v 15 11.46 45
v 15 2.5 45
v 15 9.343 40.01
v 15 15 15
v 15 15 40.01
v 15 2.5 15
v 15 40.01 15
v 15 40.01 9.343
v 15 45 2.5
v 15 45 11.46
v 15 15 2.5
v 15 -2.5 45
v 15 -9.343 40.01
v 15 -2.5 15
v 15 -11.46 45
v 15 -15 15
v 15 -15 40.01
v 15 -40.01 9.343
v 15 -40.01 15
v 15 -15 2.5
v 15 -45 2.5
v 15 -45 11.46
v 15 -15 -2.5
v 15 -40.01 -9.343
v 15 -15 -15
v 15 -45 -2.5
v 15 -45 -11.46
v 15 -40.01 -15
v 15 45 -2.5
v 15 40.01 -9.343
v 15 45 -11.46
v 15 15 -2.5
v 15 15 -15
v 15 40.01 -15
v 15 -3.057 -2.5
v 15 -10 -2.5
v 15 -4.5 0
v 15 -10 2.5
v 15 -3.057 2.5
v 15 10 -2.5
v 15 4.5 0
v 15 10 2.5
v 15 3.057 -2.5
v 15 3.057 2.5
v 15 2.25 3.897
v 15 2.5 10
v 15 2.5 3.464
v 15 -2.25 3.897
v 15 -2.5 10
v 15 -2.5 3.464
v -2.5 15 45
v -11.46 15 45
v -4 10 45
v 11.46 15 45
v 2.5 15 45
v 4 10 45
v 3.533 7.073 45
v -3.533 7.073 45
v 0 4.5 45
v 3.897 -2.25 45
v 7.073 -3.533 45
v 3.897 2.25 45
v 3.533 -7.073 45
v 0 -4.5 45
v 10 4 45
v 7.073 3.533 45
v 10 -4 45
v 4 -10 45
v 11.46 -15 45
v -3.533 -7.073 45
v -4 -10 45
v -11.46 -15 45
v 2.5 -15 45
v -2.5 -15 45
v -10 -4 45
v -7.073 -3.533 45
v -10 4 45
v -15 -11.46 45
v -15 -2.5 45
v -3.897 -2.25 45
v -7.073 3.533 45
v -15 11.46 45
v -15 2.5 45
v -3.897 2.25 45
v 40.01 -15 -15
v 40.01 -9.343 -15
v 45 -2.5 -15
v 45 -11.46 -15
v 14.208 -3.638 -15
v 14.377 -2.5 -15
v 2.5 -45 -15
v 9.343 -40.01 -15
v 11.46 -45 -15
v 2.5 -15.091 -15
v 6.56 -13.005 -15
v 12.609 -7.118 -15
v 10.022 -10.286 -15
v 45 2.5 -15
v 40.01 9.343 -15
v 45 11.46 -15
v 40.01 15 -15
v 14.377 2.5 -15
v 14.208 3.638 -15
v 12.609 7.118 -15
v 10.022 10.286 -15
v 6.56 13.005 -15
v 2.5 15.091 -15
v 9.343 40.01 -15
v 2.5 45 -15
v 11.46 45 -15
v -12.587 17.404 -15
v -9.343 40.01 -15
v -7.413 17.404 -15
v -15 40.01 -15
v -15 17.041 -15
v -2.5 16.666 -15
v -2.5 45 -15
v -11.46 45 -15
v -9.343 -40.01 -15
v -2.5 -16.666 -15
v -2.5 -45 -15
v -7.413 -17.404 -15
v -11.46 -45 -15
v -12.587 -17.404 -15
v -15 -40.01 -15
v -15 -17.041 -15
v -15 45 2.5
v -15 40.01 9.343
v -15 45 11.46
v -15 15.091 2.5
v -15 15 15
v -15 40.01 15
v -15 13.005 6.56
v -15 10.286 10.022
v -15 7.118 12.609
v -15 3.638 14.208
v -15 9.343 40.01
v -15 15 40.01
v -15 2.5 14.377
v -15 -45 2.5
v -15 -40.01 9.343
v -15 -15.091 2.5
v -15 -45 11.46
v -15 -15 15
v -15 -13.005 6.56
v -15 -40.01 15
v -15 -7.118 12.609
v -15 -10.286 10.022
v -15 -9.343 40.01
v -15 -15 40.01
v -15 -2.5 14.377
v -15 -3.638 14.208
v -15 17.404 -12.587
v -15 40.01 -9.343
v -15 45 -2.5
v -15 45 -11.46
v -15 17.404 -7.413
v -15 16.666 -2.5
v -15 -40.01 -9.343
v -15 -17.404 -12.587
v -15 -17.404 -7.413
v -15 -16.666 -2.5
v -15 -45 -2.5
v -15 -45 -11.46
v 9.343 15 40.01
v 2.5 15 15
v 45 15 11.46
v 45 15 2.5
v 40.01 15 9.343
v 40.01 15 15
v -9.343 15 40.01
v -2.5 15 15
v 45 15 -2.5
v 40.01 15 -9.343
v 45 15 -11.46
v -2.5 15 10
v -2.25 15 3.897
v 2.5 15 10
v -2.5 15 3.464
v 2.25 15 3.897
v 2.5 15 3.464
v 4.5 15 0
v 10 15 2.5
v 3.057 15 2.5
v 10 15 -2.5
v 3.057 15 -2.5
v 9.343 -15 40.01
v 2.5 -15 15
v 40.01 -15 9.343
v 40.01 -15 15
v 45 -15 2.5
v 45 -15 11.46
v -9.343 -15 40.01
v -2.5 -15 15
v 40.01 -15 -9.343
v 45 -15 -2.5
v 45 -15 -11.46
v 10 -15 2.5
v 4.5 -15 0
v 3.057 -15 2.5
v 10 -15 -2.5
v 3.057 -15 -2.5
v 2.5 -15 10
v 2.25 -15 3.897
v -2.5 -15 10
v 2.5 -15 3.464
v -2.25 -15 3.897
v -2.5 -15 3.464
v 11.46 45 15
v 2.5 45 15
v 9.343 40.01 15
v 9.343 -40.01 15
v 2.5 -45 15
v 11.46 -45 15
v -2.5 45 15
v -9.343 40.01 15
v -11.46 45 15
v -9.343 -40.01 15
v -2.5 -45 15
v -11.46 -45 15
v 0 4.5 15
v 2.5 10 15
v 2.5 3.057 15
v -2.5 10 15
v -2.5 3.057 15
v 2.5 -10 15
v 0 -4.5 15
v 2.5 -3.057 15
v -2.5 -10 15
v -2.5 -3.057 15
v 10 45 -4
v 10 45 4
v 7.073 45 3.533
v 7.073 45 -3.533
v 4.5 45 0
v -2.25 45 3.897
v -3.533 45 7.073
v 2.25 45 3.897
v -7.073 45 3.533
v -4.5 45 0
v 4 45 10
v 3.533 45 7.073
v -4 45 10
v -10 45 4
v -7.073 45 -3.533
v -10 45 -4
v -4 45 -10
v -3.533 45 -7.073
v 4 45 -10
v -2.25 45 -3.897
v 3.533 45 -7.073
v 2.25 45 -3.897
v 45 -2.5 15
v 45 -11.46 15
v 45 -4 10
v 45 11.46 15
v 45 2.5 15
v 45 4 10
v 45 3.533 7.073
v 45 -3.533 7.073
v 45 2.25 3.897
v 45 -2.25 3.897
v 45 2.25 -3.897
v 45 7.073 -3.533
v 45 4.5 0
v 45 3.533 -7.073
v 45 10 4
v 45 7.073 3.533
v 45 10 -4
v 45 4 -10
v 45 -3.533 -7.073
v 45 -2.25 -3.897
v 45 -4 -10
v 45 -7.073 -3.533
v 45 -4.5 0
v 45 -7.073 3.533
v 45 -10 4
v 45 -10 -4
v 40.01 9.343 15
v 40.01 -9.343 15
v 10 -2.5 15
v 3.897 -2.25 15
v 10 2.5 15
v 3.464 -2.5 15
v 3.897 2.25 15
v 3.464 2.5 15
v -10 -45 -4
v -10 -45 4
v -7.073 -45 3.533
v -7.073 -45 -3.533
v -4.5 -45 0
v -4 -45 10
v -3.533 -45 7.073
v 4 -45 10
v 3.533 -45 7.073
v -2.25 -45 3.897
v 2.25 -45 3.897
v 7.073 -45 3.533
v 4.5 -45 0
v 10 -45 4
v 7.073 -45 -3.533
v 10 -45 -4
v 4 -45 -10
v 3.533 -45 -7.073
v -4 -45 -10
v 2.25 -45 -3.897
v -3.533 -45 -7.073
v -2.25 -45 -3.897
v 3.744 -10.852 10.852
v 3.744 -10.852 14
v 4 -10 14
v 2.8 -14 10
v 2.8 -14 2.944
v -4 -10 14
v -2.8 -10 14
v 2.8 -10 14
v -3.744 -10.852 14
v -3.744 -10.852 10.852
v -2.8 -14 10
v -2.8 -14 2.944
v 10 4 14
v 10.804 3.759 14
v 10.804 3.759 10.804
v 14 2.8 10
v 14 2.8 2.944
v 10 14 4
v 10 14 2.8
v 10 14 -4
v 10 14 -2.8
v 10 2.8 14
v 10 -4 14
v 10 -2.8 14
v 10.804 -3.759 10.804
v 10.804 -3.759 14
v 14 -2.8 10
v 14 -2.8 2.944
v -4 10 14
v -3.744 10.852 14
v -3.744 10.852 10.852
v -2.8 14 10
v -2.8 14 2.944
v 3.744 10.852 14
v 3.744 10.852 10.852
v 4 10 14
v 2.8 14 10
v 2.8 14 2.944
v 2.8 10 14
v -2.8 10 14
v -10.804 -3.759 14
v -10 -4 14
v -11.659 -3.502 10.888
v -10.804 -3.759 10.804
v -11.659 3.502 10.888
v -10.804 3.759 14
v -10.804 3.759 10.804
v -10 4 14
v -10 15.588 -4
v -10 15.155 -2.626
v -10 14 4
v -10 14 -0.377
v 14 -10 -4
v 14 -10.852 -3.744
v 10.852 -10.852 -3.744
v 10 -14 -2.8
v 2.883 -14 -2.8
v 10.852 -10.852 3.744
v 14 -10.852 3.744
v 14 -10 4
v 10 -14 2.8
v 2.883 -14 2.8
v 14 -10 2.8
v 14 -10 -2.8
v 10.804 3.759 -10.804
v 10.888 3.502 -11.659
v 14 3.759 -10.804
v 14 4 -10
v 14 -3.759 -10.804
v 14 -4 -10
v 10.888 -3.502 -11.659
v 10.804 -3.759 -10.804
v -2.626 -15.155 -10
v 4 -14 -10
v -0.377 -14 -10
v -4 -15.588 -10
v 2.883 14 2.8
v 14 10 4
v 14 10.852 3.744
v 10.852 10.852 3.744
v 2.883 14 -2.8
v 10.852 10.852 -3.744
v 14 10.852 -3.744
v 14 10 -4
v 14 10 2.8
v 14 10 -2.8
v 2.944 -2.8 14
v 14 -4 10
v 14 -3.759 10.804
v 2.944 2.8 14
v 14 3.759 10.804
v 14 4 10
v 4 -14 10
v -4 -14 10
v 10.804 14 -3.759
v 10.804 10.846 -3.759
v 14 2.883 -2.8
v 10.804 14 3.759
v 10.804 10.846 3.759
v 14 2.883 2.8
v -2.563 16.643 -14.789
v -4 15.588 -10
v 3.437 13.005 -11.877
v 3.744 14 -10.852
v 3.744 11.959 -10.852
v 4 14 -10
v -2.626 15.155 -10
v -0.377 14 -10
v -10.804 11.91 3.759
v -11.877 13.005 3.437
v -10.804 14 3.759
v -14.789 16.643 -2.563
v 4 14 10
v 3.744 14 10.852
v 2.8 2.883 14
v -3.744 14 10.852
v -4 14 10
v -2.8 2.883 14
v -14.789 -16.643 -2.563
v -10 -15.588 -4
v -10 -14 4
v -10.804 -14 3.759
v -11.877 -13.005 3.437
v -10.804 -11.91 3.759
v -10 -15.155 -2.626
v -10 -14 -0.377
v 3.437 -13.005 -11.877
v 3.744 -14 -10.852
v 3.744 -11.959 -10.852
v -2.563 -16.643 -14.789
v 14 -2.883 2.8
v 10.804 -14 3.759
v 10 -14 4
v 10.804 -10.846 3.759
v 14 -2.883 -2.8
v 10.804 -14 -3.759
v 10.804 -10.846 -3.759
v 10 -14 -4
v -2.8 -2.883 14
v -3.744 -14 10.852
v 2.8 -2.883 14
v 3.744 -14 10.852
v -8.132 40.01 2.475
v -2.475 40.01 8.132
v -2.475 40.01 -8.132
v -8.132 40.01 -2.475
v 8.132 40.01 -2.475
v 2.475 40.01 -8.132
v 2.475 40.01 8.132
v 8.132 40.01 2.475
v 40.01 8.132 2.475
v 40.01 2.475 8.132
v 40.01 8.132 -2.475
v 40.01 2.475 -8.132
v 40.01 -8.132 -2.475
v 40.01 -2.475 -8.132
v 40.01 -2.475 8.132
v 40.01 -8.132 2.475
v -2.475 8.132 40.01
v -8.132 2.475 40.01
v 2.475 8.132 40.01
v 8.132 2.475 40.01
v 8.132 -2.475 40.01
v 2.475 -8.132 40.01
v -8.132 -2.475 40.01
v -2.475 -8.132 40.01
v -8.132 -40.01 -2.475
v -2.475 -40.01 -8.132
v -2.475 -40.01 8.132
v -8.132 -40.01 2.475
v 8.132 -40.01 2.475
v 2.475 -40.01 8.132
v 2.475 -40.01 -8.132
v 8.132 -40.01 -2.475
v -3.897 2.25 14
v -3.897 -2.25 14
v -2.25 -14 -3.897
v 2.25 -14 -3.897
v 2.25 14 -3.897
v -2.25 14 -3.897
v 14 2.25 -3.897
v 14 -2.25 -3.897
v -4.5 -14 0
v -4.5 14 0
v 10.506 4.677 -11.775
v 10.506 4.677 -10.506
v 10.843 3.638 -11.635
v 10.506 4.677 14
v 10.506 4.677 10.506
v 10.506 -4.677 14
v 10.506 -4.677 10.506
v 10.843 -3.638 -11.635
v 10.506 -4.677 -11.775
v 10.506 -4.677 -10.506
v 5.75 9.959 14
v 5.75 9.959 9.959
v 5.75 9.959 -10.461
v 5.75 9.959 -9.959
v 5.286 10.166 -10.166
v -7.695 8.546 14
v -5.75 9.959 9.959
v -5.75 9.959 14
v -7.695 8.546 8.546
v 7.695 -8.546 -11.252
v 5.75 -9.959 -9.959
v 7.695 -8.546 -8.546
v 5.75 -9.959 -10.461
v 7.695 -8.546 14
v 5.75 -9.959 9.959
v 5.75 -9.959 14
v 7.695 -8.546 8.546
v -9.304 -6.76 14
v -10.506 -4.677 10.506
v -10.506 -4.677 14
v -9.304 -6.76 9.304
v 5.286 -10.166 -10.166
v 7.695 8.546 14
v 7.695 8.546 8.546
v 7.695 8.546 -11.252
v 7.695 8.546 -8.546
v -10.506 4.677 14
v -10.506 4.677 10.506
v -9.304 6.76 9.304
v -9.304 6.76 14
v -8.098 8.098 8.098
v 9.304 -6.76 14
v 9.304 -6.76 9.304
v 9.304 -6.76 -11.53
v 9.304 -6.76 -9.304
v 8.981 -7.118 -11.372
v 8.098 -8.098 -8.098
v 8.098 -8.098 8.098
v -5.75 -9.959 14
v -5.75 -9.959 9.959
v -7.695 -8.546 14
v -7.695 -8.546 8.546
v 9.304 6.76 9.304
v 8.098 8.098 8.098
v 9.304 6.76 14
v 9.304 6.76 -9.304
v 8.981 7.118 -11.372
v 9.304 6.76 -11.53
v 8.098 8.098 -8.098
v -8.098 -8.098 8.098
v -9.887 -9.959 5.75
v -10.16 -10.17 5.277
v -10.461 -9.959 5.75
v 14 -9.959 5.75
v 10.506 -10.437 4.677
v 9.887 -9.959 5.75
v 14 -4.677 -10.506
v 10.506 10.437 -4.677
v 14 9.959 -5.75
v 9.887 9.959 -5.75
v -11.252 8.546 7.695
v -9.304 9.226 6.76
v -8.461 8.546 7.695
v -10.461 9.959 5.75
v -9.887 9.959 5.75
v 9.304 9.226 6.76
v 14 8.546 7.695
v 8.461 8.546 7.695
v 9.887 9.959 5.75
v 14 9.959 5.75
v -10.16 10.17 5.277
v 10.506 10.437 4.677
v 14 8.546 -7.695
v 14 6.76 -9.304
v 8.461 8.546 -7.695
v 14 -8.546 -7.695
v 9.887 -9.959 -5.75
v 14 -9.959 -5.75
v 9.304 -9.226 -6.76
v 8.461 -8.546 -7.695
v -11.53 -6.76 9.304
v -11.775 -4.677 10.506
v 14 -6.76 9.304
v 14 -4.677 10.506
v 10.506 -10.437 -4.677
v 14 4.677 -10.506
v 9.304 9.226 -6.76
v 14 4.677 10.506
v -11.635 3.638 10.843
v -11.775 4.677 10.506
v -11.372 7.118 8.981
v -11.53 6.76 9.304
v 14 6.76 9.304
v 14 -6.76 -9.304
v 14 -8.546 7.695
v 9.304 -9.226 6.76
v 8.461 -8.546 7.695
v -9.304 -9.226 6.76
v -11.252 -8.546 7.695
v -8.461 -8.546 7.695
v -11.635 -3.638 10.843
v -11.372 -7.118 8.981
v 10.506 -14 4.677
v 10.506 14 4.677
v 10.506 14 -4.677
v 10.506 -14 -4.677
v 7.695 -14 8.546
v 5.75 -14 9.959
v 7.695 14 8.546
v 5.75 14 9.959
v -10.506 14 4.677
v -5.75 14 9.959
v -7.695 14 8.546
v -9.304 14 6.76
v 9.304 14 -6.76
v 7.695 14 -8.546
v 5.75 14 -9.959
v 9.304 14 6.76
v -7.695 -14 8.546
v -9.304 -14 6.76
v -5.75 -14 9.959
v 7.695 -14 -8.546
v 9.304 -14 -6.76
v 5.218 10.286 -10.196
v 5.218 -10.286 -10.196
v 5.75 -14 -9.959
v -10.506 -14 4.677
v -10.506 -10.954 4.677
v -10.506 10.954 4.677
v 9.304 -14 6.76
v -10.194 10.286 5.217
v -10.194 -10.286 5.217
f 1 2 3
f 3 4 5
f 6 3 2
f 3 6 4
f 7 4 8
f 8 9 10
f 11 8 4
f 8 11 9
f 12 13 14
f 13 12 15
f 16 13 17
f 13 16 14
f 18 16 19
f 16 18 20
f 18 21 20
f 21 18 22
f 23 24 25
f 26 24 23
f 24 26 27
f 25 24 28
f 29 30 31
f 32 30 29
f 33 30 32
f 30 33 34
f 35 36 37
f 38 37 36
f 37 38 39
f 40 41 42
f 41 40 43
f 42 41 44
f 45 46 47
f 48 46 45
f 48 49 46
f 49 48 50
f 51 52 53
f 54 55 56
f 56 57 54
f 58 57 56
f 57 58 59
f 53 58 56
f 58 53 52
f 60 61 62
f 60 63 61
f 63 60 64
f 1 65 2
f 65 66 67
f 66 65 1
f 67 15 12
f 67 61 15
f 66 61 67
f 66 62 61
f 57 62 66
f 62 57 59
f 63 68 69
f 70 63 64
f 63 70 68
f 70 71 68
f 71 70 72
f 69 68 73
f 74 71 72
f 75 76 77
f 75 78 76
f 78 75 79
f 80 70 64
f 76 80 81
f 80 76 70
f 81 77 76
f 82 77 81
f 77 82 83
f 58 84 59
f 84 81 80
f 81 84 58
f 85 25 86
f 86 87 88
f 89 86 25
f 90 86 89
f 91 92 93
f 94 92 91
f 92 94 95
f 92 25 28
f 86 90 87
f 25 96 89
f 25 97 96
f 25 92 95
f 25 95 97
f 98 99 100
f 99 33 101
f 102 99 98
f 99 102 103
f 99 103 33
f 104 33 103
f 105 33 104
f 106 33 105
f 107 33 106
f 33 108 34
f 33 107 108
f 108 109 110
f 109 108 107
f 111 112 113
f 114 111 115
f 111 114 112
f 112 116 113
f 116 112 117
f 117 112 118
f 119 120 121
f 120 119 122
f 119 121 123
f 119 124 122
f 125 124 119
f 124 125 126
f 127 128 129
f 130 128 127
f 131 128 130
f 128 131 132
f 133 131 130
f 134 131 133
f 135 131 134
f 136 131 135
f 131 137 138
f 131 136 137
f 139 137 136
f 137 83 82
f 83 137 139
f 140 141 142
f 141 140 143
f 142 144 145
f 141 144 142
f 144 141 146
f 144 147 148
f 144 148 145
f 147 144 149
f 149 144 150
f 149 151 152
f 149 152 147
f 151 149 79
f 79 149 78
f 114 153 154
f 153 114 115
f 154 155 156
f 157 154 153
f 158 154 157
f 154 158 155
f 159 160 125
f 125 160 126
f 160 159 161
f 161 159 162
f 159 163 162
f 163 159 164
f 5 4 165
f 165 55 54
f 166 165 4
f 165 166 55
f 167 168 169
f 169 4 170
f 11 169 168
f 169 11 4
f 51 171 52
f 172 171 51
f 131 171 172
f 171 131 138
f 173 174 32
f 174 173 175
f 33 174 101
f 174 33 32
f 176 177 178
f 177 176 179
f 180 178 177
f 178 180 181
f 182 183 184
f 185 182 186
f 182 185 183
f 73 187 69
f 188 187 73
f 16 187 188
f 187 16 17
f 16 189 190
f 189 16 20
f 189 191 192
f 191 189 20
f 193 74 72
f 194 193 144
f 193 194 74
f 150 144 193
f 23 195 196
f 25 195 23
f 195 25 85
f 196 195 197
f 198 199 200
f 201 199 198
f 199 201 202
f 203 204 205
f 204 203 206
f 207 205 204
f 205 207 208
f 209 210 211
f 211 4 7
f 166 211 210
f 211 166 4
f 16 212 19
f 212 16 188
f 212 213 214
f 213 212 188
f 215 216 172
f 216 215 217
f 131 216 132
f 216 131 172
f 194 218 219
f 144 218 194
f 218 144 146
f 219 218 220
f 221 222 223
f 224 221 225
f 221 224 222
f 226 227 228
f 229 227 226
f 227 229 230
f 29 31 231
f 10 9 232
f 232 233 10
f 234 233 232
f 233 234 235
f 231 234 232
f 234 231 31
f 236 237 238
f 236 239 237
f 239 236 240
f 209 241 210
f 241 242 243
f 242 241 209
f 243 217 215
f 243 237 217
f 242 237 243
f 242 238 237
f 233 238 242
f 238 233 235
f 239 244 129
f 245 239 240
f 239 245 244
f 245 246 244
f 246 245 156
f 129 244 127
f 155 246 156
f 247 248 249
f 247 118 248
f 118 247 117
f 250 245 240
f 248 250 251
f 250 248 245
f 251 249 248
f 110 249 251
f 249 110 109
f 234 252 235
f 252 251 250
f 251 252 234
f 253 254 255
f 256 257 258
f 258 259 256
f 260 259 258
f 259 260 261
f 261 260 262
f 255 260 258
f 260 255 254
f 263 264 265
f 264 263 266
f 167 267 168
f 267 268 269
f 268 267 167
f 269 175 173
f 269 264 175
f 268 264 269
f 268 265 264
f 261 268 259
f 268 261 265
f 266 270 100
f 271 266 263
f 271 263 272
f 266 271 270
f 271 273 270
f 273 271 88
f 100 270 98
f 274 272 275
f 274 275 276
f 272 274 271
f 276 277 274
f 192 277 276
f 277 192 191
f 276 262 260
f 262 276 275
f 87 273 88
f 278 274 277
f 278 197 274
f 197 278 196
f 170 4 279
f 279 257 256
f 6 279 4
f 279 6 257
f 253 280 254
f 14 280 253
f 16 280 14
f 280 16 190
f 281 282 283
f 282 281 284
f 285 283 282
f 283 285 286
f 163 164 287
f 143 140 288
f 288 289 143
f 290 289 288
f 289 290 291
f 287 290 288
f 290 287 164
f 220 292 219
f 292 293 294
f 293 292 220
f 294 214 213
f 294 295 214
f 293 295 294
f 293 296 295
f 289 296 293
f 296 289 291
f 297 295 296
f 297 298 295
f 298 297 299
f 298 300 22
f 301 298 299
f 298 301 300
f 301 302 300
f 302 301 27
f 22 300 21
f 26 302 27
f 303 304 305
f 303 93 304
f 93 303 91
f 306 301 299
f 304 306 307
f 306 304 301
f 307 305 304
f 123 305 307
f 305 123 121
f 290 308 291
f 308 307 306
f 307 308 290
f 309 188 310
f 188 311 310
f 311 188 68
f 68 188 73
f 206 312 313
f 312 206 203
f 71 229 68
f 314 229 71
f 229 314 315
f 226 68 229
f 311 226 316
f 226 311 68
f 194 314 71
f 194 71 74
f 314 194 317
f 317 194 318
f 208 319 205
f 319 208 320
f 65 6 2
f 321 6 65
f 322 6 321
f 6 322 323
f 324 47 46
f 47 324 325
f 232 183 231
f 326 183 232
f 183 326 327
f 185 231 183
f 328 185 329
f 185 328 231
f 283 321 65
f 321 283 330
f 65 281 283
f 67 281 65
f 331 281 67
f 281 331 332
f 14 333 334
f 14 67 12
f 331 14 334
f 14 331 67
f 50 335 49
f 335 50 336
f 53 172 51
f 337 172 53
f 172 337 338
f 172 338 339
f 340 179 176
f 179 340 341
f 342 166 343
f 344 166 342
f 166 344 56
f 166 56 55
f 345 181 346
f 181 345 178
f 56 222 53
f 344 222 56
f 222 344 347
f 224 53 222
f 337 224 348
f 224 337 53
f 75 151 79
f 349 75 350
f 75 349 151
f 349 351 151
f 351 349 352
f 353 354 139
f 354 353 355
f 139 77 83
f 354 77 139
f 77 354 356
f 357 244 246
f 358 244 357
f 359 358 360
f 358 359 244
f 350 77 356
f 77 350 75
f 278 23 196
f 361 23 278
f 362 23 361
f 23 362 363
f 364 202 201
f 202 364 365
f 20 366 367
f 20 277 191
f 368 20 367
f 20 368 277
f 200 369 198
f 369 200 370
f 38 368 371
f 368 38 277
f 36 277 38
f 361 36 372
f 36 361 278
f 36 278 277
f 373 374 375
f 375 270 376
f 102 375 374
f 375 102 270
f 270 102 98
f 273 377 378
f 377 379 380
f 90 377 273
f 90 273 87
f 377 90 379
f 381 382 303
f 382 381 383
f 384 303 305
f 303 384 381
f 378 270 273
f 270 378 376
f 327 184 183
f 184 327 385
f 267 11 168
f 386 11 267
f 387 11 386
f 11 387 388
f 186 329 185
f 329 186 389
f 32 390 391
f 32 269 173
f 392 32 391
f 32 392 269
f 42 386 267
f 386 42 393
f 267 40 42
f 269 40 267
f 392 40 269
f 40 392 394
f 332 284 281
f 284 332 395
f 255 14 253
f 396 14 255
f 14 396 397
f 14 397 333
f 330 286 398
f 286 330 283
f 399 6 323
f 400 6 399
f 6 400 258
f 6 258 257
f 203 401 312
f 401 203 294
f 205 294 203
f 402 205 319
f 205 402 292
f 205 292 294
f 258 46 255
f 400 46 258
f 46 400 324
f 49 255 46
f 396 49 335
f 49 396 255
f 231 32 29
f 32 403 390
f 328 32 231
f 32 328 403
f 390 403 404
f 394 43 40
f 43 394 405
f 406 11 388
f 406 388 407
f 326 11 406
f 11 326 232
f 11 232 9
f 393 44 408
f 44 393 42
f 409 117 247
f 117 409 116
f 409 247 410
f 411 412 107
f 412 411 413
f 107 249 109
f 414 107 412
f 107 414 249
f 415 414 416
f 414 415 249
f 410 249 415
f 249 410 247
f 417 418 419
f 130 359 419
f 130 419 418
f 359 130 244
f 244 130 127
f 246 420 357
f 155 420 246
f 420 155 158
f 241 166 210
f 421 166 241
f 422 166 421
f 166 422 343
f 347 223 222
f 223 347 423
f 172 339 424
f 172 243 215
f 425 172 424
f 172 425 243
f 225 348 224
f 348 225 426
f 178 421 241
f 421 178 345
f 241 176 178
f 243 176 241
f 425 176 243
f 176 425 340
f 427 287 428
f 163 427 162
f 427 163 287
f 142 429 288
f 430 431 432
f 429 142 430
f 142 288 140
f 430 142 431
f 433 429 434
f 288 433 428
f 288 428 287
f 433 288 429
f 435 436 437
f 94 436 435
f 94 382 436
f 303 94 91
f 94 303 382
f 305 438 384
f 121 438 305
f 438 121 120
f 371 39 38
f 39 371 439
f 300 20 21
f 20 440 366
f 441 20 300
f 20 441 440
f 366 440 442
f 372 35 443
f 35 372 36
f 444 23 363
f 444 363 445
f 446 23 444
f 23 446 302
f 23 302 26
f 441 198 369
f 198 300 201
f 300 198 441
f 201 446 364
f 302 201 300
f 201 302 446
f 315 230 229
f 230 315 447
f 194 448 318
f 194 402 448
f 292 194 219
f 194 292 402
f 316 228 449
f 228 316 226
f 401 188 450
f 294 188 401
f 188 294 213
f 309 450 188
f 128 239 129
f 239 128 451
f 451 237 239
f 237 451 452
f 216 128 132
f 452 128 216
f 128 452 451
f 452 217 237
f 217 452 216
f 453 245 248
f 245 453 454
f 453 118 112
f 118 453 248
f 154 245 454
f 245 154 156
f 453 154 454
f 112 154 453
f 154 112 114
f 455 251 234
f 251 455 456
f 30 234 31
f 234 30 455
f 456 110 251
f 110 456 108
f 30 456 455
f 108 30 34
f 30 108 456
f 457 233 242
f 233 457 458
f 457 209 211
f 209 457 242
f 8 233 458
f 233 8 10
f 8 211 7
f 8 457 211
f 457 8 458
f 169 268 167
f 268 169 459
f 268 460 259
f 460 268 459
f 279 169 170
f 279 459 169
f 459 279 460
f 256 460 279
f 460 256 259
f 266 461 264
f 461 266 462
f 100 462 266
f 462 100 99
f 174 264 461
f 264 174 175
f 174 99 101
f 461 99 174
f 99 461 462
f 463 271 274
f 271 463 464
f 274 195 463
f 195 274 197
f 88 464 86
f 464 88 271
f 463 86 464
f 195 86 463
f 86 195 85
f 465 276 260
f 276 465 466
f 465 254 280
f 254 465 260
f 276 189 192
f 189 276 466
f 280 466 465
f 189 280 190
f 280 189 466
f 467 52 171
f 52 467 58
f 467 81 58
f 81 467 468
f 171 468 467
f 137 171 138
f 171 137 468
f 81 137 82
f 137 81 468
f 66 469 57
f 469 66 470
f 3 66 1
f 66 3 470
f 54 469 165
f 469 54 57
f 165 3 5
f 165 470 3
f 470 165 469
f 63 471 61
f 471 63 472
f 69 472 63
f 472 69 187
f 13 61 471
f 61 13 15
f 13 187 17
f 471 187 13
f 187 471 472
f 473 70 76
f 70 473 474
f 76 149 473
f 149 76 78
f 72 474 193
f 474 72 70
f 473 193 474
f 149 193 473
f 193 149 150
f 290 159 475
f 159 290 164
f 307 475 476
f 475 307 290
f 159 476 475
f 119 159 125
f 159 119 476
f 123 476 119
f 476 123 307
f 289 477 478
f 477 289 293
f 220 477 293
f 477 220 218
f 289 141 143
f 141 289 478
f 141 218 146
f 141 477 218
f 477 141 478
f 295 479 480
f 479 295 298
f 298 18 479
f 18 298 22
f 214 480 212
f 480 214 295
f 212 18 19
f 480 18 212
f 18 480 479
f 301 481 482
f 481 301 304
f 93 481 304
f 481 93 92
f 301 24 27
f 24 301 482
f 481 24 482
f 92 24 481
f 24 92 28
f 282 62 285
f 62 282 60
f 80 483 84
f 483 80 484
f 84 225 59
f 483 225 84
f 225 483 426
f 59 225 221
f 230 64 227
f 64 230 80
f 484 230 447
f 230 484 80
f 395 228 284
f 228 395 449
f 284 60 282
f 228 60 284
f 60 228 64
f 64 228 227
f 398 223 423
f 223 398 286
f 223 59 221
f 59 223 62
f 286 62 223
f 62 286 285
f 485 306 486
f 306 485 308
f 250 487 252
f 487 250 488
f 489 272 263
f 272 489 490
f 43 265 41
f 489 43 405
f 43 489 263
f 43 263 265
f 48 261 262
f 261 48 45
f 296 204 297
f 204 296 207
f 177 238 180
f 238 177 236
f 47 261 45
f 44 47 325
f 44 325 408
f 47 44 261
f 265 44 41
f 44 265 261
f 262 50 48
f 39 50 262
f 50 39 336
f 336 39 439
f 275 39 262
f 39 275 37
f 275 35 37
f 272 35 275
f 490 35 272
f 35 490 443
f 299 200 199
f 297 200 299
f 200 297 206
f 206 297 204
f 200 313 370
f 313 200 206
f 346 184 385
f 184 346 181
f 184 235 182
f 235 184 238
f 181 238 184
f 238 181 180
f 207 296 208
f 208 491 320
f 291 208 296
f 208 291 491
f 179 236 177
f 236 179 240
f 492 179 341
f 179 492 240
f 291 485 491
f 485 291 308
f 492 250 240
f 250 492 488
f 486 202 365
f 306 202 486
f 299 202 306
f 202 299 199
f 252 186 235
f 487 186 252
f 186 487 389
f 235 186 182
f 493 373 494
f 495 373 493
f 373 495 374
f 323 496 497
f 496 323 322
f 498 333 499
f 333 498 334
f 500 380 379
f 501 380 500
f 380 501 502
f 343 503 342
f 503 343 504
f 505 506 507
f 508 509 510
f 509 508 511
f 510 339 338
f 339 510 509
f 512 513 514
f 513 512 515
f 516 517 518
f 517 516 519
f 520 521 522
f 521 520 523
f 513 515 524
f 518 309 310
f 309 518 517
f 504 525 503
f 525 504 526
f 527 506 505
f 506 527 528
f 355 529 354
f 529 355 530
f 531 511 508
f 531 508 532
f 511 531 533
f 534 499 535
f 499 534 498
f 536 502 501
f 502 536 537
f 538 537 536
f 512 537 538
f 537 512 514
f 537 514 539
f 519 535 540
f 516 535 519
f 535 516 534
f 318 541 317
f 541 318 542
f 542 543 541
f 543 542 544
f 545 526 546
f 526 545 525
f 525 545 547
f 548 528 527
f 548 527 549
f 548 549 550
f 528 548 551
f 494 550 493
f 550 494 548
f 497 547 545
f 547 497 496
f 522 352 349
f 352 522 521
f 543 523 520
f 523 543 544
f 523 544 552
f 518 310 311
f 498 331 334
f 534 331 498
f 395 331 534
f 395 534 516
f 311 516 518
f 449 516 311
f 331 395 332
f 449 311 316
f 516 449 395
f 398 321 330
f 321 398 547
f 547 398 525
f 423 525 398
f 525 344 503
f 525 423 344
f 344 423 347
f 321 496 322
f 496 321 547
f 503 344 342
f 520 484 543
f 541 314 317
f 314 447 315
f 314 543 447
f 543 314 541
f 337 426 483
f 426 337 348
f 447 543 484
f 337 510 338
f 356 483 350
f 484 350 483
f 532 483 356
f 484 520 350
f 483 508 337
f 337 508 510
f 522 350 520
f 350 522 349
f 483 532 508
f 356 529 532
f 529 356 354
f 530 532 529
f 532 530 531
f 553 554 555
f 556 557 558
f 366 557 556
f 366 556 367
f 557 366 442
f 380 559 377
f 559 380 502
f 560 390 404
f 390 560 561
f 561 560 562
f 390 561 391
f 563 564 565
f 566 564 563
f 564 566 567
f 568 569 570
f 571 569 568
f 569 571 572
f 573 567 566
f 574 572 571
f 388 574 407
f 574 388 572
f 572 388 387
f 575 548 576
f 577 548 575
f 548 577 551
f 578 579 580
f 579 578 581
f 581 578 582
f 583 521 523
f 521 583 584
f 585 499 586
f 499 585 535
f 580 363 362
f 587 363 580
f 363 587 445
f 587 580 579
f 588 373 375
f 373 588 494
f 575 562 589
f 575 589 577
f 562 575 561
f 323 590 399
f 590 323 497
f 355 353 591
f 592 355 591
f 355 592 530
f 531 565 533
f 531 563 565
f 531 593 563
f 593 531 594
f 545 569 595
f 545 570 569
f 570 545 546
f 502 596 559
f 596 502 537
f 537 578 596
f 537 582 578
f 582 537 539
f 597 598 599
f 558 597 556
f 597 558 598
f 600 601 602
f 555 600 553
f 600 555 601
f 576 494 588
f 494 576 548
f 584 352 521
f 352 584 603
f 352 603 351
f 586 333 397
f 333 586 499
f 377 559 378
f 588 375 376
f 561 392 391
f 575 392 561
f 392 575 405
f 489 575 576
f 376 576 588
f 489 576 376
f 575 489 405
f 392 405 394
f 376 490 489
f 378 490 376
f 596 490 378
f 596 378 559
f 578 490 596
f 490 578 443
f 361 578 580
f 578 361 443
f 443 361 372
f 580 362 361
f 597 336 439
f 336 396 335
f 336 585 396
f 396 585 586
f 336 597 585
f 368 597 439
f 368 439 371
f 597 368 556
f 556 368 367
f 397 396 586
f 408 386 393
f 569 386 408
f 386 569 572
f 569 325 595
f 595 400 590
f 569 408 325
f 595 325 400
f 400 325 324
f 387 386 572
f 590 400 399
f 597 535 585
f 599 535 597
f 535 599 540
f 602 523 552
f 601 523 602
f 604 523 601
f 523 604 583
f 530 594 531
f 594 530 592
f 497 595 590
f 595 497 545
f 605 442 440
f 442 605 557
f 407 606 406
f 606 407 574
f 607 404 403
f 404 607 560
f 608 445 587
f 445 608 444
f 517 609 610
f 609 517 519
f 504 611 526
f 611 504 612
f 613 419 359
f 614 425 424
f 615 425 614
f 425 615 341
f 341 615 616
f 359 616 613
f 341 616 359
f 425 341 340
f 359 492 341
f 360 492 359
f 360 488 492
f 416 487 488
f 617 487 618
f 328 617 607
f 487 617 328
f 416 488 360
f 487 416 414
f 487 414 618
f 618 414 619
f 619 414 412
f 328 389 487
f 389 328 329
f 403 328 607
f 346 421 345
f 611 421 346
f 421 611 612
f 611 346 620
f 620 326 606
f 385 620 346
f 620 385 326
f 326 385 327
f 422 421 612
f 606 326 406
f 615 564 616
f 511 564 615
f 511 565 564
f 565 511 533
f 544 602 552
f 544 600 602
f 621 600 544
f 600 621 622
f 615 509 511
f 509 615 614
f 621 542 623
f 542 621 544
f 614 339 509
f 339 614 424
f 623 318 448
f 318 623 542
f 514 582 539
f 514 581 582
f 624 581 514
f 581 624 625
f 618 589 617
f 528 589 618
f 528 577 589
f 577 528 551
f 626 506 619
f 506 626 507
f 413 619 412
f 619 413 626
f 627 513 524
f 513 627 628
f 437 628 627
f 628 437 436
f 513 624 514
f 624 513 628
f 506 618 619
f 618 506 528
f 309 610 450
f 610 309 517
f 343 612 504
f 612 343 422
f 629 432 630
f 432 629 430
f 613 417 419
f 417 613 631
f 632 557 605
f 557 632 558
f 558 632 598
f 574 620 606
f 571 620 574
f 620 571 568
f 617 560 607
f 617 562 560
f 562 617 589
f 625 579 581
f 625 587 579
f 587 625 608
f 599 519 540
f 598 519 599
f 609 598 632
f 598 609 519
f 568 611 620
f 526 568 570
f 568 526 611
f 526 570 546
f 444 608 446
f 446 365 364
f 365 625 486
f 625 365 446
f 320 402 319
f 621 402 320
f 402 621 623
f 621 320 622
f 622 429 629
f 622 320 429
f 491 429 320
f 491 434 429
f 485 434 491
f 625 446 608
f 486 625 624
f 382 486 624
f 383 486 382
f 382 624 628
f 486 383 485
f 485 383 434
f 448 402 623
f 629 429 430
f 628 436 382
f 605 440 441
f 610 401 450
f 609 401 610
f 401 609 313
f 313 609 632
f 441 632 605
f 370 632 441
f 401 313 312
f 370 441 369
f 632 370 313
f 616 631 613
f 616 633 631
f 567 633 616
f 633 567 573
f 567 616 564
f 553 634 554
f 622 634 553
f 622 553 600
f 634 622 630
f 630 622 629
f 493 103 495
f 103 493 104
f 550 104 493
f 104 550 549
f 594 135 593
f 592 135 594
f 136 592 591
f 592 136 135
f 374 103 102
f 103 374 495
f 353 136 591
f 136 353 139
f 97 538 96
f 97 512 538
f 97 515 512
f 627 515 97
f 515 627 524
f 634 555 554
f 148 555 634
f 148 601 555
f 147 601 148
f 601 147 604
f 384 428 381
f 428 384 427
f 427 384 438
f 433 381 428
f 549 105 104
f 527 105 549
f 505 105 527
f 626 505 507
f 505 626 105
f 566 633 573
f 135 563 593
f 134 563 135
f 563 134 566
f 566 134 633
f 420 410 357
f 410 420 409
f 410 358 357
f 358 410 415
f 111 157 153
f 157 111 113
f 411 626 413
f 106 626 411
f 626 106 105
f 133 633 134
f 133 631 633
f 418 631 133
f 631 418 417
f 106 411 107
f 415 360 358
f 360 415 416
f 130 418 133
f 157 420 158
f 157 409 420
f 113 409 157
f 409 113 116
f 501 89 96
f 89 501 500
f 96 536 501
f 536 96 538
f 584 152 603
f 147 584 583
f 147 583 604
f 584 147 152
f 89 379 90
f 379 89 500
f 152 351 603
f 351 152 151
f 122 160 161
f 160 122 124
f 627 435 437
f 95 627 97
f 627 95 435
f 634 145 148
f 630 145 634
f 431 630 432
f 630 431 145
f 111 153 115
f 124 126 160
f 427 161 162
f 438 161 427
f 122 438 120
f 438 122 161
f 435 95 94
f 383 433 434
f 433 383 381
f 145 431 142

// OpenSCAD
// file: ../../globals.scad
/*
Most things in this file is represented as one millimeter, so keep that in mind while changing things.
Some of the setting are not mm but at variables that you can set, such as 2*x=2x and you are setting what x is.
I will try to specify when things are variables and not exact measurements.
*/

//Virindi settings
dovetail_male_width_scale = 0.98;
dovetail_male_height_scale = 0.91;

obj_leg = 30;
leg_length = 5.5;
small_number = 0.001;
metal_core_rode_global = 5;


///////////////// number of holes /////////////////////
z_hole_number = 8;
other_holes = 8;

///////////////// Pins /////////////////////

//pins that poke out
ball_size = 10;
pin_height = 20;
pin_diameter = 6;


//holes
hole_ball_size = ball_size;
hole_pin_height = pin_height;
hole_pin_diameter = pin_diameter;

///////////////// Z THINGS /////////////////////

berring_slot_width = 7.5;
berring_slot_depth = 6.5;
metal_core_rode = 5;

///////////////// X THINGS /////////////////////

//male dove tails
max_width=8;
min_width=5;
depth=5;
height=obj_leg/2;

//female dove tails, this is found on the y mounts
girl_max_width=11;
girl_min_width=5;
girl_depth=5;
girl_height=obj_leg;


///////////////// Y THINGS /////////////////////
/*
The Y is so normal that all of those global variables at the top should change all of the setting in it, this section is set her incase there are variables set in the future development of this project.
*/
// file: ../../include.scad
//////////////////      END SECTION       //////////////////

	module added_pins(){
		difference(){
			union(){
				translate([30/(15/4),obj_leg*leg_length,30/(15/4)]) pin();
				translate([30/(15/4)+14.5,obj_leg*leg_length,30/(15/4)+14]) pin();
			}
			union(){
							translate([30/(15/4)+13.5,obj_leg*leg_length-20,30/(15/4)+5])cube(size=[2,40,15]);
							translate([30/(15/4)+7.5,obj_leg*leg_length-20,30/(15/4)+15])rotate([0,90,0]) cube(size=[2,40,15]);	

							translate([30/(15/4)-1,obj_leg*leg_length-20,30/(15/4)-8])cube(size=[2,40,15]);
							translate([30/(15/4)-10,obj_leg*leg_length-20,30/(15/4)+1])rotate([0,90,0]) cube(size=[2,40,15]);
			}
		}
	}
	module taken_pins() {
		translate([30/(15/4)+14,obj_leg*leg_length-10,30/(15/4)]) mirror_pin();
		translate([30/(15/4),obj_leg*leg_length-10,30/(15/4)+15]) mirror_pin();
	}


//////////////////      OTHER STUFF       //////////////////

	module holes() {
		rotate([0,0,90]) for(y=[0:other_holes])
		translate([obj_leg+y*15,-15.5,7.5]) union() {
			translate([7.5,0,15]) hole_up();
			hole_down();
		}
	}
	module extend_holes() {
	module top(){
		rotate([0,0,90]) for(y=[0:other_holes+1])
		translate([(30/4)+y*15,-15.5,7.5]) union() {
			translate([7.5,0,15]) hole_up();
		}
	}
	module bottom(){
		rotate([0,0,90]) for(y=[0:other_holes+2])
		translate([(30/4)+y*15,-15.5,7.5]) union() {
			hole_down();
		
}
	}
	union(){
		top();
		bottom();
	}
	}

	module hole() {
		union() {
			rotate([90, 90, 0]) cylinder(h=40, d=hole_pin_diameter, center=true);
			translate([0,7.5,0]) sphere(d=hole_ball_size);
			translate([0,-6,0]) sphere(d=hole_ball_size);
		}
	}
	module hole_up() {
		union() {
			rotate([90, 90, 0]) cylinder(h=40, d=hole_pin_diameter, center=true);
			translate([0,7.5,10]) cylinder(h=hole_pin_height, d=hole_pin_diameter, center=true);
			translate([0,-6,10]) cylinder(h=hole_pin_height, d=hole_pin_diameter, center=true);
			translate([0,7.5,0]) sphere(d=hole_ball_size);
			translate([0,-6,0]) sphere(d=hole_ball_size);
		}
	}
	module hole_down() {
		union() {
			rotate([90, 90, 0]) cylinder(h=40, d=hole_pin_diameter, center=true);
			translate([0,7.5,-10]) cylinder(h=hole_pin_height, d=hole_pin_diameter, center=true);
			translate([0,-6,-10]) cylinder(h=hole_pin_height, d=hole_pin_diameter, center=true);
			translate([0,7.5,0]) sphere(d=hole_ball_size);
			translate([0,-6,0]) sphere(d=hole_ball_size);
		}
	}
	module pin() {
		union() {
			rotate([90, 90, 0]) cylinder(h=pin_height, d=pin_diameter, center=true);
			translate([0,7.5,0]) sphere(d=ball_size);
		}
	}

	module mirror_pin() {
		rotate([90, 90, 0]) cylinder(h=hole_pin_height+small_number, d=hole_pin_diameter, center=true);
		translate([0,-(pin_height-(ball_size/2)),0]) sphere(d=ball_size);
	}


//////////////////      SOME RACK AND Z THINGS       //////////////////

module z_holes() {
    rotate([0,-90,0]) for(z=[0:z_hole_number])
    translate([22.5+z*15,16,-12])
        hole();
}

module pin_cuts() {
	union(){
		cube(size=[2,10,40], center=true);
		rotate([0,0,90]) cube(size=[2,10,40], center=true);
	}
}
module pin_uncut() {
	union(){
		rotate([0, 0, 90]) cylinder(h=hole_pin_height, d=hole_pin_diameter, center=true);
		translate([0,0,10]) sphere(d=ball_hole);
	}
}


module pin_out() {
	union(){
		rotate([0, 0, 90]) cylinder(h=pin_height, d=pin_diameter, center=true);
		translate([0,0,10]) sphere(d= ball_size);
	}
}


module pins_z(){
	difference() {
		pin_out();
		pin_cuts();
	}
}
//////////////////      RACK AND SLIDE     ///////////////////

module straight_pins() {
	for(z=[0:((((obj_leg*leg_length)*2)-(obj_leg*2))/3)/14.5]) rotate([-90,0,0]) translate([z*15,30/(15/4),14]) pins_z();
	for(z=[0:((((obj_leg*leg_length)*2)-(obj_leg*2))/3)/14.5]) rotate([-90,0,0]) translate([z*15,30/(15/4)-14,14]) pins_z();
}
module stagger_pins() {
	for(z=[0:((((obj_leg*leg_length)*2)-(obj_leg*2))/3)/14.5]) rotate([-90,0,0]) translate([z*15,30/(15/4),14]) pins_z();
	for(z=[0:((((obj_leg*leg_length)*2)-(obj_leg*2))/3)/14.5]) rotate([-90,0,0]) translate([z*15+7,30/(15/4)-14,14]) pins_z();
}


//////////////////      DOVE TAIL       //////////////////

module male_dovetail(height) {
	dovetail_3d(max_width,min_width,depth,height);
}

module dovetail_3d(max_width=11, min_width=5, depth=5, height=30) {
	linear_extrude(height=height, convexity=2)
		dovetail_2d(max_width,min_width,depth);
}

module dovetail_2d(max_width=11, min_width=5, depth=5) {
	angle=atan((max_width/2-min_width/2)/depth);
	echo("angle: ", angle);
	polygon(paths=[[0,1,2,3,0]], points=[[-min_width/2,0], [-max_width/2,depth], [max_width/2, depth], [min_width/2,0]]);
}

//bow tie
	module tie_end(height){
				rotate([0,0,0]) translate([0,-0.01,((obj_leg/2)/2)]) male_dovetail(height);
				rotate([0,90,0]) translate([0,-0.01,((obj_leg/2)/2)]) male_dovetail(height);
				rotate([0,180,0]) translate([0,-0.01,((obj_leg/2)/2)]) male_dovetail(height);
				rotate([0,-90,0]) translate([0,-0.01,((obj_leg/2)/2)]) male_dovetail(height);
	}

module bow_support(){
	difference(){
		intersection(){
			translate([-15,0,-15]) cube([30,9,30]);
			scale([1.05,1.05,1.05]) rotate([0,45,0]) tie_end();
		}
		cube([29.2,29.2,29.2], center=true);
	}
}

	module wrap(units){
	for (y = [-1:units-2]) // two iterations, z = -1, z = 1
	{
			translate([15, (y*30)+15, 15]){
			for (r = [0:4]) // two iterations, z = -1, z = 1
			{
				rotate([0,r*90,0]) translate([0,15,15]) rotate([-90,0,0])male_dovetail(height=30);
			}
		}
	}
	}
// main file
include <../../include.scad>;
include <../../globals.scad>;
//if you can do pretty far over hangs, like an SLA printer or something then take this off by setting it to flase.
    support = false;
	slot_translate = .5;
	rod_size = .5;
module basic_corner(){
	module added(){
			translate([0,0,15]) cube([obj_leg,obj_leg,obj_leg*2], center=true);
			translate([0,15,0]) cube([obj_leg,obj_leg*2,obj_leg], center=true);
			translate([15,0,0]) cube([obj_leg*2,obj_leg,obj_leg], center=true);
            translate([0,-15,0]) cube([obj_leg,obj_leg*2,obj_leg], center=true);
	}
	module taken(){
		rotate([0,0,90]) cylinder(d=9, h=obj_leg*5, center=true, $fn=6);
		rotate([90,0,0]) rotate([0,90,0]) cylinder(d=9, h=obj_leg*5, center=true, $fn=6);
		rotate([90,0,0]) cylinder(d=9, h=obj_leg*5, center=true, $fn=6);
        rotate([-90,0,0]) cylinder(d=9, h=obj_leg*5, center=true, $fn=6);
		cylinder(d=23, h=28, center=true);
		rotate([0,90,0]) cylinder(d=23, h=28, center=true);
		rotate([90,0,0]) cylinder(d=23, h=28, center=true);
        rotate([-90,0,0]) cylinder(d=23, h=28, center=true);
		module wrap(){
			translate([0,-15,0]) male_dovetail(height=50);
			rotate([0,0,90]) translate([0,-15,0]) male_dovetail(height=50);
			rotate([0,0,180]) translate([0,-15,0]) male_dovetail(height=50);
			rotate([0,0,-90]) translate([0,-15,0]) male_dovetail(height=50);
		}
		wrap();
		rotate([0,90,0]) wrap();
		rotate([-90,90,0]) wrap();
        rotate([90,90,0]) wrap();
		rotate([0,45,180]) translate([0,-45,0]) tie_end();
		rotate([0,45,90]) translate([0,-45,0]) tie_end();
		rotate([-90,0,45]) translate([0,-45,0]) tie_end();
        rotate([180,0,0]) rotate([0,45,180]) translate([0,-45,0]) tie_end();

	}
	module corner() {
		difference(){
			added();
			taken();
		}
	};
	rotate([45,0,0]) corner();
};
module full_corner(){
	module support_pillers(){
		
		translate([48-slot_translate/2,3,0]) cylinder(h=11,d=4);
		translate([48-slot_translate/2,-3,0]) cylinder(h=11,d=4);
		
		translate([39-slot_translate/2,18,24]) rotate([0,-40,0]) cylinder(h=6,d=4);
		translate([39-slot_translate/2,-18,24]) rotate([0,-40,0]) cylinder(h=6,d=4);
	}
	if (support==true)
	{
		support_pillers();
		rotate([0,0,(360/3)*2]) support_pillers();
		rotate([0,0,(360/3)*1]) support_pillers();
	}
	difference(){
		translate([0,0,0]) rotate([0,-35,0])basic_corner();
		union(){
			//cylinder(h=50, d=15);
			//translate([0,0,-25]) cube([200,200,50], center=true);
		}
	}
}

difference(){
rotate([-45,0,0])
rotate([0,35,0])
full_corner();
    
translate([0,0,-25])
rotate([0,-45,0])
cylinder(h=200,d=35,center=true);
}
